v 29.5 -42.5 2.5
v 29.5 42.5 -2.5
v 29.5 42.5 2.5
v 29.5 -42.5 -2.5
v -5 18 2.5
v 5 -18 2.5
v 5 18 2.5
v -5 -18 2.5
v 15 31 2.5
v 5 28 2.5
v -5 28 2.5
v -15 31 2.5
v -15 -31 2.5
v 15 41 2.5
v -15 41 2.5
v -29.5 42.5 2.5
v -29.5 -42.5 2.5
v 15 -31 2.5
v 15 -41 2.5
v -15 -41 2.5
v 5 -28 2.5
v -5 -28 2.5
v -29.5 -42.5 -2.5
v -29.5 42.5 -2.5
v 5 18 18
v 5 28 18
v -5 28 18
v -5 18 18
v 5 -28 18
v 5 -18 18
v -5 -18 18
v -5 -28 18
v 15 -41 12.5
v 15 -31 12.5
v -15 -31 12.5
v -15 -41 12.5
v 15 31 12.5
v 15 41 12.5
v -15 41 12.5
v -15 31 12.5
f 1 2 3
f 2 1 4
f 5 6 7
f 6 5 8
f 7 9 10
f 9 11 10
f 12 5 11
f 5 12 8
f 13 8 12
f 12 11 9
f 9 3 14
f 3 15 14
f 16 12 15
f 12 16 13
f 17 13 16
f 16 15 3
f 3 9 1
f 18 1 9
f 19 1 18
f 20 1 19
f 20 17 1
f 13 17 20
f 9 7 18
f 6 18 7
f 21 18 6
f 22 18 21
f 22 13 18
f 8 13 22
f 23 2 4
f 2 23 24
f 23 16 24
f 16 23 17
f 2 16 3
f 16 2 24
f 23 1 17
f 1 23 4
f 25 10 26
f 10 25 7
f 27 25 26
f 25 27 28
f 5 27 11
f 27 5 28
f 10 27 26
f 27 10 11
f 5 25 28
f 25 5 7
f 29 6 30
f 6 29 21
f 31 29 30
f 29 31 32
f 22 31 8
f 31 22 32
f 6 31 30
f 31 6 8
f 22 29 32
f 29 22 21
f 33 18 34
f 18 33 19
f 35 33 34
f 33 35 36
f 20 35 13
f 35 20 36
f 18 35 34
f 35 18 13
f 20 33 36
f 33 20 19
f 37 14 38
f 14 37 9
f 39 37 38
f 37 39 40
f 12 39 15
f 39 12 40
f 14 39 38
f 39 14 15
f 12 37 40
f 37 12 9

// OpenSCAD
union(){
cube(size = [59,85,5], center = true);

translate([0, (56/2) - 5, 8]){
    cube(size = [10,10,20], center = true);
}

translate([0, -((56/2) - 5), 8]){
    cube(size = [10,10,20], center = true);
}

translate([0, -((56/2) +8), 7]){
    cube(size = [30,10,11], center = true);
}

translate([0, ((56/2) +8), 7]){
    cube(size = [30,10,11], center = true);
}
}
